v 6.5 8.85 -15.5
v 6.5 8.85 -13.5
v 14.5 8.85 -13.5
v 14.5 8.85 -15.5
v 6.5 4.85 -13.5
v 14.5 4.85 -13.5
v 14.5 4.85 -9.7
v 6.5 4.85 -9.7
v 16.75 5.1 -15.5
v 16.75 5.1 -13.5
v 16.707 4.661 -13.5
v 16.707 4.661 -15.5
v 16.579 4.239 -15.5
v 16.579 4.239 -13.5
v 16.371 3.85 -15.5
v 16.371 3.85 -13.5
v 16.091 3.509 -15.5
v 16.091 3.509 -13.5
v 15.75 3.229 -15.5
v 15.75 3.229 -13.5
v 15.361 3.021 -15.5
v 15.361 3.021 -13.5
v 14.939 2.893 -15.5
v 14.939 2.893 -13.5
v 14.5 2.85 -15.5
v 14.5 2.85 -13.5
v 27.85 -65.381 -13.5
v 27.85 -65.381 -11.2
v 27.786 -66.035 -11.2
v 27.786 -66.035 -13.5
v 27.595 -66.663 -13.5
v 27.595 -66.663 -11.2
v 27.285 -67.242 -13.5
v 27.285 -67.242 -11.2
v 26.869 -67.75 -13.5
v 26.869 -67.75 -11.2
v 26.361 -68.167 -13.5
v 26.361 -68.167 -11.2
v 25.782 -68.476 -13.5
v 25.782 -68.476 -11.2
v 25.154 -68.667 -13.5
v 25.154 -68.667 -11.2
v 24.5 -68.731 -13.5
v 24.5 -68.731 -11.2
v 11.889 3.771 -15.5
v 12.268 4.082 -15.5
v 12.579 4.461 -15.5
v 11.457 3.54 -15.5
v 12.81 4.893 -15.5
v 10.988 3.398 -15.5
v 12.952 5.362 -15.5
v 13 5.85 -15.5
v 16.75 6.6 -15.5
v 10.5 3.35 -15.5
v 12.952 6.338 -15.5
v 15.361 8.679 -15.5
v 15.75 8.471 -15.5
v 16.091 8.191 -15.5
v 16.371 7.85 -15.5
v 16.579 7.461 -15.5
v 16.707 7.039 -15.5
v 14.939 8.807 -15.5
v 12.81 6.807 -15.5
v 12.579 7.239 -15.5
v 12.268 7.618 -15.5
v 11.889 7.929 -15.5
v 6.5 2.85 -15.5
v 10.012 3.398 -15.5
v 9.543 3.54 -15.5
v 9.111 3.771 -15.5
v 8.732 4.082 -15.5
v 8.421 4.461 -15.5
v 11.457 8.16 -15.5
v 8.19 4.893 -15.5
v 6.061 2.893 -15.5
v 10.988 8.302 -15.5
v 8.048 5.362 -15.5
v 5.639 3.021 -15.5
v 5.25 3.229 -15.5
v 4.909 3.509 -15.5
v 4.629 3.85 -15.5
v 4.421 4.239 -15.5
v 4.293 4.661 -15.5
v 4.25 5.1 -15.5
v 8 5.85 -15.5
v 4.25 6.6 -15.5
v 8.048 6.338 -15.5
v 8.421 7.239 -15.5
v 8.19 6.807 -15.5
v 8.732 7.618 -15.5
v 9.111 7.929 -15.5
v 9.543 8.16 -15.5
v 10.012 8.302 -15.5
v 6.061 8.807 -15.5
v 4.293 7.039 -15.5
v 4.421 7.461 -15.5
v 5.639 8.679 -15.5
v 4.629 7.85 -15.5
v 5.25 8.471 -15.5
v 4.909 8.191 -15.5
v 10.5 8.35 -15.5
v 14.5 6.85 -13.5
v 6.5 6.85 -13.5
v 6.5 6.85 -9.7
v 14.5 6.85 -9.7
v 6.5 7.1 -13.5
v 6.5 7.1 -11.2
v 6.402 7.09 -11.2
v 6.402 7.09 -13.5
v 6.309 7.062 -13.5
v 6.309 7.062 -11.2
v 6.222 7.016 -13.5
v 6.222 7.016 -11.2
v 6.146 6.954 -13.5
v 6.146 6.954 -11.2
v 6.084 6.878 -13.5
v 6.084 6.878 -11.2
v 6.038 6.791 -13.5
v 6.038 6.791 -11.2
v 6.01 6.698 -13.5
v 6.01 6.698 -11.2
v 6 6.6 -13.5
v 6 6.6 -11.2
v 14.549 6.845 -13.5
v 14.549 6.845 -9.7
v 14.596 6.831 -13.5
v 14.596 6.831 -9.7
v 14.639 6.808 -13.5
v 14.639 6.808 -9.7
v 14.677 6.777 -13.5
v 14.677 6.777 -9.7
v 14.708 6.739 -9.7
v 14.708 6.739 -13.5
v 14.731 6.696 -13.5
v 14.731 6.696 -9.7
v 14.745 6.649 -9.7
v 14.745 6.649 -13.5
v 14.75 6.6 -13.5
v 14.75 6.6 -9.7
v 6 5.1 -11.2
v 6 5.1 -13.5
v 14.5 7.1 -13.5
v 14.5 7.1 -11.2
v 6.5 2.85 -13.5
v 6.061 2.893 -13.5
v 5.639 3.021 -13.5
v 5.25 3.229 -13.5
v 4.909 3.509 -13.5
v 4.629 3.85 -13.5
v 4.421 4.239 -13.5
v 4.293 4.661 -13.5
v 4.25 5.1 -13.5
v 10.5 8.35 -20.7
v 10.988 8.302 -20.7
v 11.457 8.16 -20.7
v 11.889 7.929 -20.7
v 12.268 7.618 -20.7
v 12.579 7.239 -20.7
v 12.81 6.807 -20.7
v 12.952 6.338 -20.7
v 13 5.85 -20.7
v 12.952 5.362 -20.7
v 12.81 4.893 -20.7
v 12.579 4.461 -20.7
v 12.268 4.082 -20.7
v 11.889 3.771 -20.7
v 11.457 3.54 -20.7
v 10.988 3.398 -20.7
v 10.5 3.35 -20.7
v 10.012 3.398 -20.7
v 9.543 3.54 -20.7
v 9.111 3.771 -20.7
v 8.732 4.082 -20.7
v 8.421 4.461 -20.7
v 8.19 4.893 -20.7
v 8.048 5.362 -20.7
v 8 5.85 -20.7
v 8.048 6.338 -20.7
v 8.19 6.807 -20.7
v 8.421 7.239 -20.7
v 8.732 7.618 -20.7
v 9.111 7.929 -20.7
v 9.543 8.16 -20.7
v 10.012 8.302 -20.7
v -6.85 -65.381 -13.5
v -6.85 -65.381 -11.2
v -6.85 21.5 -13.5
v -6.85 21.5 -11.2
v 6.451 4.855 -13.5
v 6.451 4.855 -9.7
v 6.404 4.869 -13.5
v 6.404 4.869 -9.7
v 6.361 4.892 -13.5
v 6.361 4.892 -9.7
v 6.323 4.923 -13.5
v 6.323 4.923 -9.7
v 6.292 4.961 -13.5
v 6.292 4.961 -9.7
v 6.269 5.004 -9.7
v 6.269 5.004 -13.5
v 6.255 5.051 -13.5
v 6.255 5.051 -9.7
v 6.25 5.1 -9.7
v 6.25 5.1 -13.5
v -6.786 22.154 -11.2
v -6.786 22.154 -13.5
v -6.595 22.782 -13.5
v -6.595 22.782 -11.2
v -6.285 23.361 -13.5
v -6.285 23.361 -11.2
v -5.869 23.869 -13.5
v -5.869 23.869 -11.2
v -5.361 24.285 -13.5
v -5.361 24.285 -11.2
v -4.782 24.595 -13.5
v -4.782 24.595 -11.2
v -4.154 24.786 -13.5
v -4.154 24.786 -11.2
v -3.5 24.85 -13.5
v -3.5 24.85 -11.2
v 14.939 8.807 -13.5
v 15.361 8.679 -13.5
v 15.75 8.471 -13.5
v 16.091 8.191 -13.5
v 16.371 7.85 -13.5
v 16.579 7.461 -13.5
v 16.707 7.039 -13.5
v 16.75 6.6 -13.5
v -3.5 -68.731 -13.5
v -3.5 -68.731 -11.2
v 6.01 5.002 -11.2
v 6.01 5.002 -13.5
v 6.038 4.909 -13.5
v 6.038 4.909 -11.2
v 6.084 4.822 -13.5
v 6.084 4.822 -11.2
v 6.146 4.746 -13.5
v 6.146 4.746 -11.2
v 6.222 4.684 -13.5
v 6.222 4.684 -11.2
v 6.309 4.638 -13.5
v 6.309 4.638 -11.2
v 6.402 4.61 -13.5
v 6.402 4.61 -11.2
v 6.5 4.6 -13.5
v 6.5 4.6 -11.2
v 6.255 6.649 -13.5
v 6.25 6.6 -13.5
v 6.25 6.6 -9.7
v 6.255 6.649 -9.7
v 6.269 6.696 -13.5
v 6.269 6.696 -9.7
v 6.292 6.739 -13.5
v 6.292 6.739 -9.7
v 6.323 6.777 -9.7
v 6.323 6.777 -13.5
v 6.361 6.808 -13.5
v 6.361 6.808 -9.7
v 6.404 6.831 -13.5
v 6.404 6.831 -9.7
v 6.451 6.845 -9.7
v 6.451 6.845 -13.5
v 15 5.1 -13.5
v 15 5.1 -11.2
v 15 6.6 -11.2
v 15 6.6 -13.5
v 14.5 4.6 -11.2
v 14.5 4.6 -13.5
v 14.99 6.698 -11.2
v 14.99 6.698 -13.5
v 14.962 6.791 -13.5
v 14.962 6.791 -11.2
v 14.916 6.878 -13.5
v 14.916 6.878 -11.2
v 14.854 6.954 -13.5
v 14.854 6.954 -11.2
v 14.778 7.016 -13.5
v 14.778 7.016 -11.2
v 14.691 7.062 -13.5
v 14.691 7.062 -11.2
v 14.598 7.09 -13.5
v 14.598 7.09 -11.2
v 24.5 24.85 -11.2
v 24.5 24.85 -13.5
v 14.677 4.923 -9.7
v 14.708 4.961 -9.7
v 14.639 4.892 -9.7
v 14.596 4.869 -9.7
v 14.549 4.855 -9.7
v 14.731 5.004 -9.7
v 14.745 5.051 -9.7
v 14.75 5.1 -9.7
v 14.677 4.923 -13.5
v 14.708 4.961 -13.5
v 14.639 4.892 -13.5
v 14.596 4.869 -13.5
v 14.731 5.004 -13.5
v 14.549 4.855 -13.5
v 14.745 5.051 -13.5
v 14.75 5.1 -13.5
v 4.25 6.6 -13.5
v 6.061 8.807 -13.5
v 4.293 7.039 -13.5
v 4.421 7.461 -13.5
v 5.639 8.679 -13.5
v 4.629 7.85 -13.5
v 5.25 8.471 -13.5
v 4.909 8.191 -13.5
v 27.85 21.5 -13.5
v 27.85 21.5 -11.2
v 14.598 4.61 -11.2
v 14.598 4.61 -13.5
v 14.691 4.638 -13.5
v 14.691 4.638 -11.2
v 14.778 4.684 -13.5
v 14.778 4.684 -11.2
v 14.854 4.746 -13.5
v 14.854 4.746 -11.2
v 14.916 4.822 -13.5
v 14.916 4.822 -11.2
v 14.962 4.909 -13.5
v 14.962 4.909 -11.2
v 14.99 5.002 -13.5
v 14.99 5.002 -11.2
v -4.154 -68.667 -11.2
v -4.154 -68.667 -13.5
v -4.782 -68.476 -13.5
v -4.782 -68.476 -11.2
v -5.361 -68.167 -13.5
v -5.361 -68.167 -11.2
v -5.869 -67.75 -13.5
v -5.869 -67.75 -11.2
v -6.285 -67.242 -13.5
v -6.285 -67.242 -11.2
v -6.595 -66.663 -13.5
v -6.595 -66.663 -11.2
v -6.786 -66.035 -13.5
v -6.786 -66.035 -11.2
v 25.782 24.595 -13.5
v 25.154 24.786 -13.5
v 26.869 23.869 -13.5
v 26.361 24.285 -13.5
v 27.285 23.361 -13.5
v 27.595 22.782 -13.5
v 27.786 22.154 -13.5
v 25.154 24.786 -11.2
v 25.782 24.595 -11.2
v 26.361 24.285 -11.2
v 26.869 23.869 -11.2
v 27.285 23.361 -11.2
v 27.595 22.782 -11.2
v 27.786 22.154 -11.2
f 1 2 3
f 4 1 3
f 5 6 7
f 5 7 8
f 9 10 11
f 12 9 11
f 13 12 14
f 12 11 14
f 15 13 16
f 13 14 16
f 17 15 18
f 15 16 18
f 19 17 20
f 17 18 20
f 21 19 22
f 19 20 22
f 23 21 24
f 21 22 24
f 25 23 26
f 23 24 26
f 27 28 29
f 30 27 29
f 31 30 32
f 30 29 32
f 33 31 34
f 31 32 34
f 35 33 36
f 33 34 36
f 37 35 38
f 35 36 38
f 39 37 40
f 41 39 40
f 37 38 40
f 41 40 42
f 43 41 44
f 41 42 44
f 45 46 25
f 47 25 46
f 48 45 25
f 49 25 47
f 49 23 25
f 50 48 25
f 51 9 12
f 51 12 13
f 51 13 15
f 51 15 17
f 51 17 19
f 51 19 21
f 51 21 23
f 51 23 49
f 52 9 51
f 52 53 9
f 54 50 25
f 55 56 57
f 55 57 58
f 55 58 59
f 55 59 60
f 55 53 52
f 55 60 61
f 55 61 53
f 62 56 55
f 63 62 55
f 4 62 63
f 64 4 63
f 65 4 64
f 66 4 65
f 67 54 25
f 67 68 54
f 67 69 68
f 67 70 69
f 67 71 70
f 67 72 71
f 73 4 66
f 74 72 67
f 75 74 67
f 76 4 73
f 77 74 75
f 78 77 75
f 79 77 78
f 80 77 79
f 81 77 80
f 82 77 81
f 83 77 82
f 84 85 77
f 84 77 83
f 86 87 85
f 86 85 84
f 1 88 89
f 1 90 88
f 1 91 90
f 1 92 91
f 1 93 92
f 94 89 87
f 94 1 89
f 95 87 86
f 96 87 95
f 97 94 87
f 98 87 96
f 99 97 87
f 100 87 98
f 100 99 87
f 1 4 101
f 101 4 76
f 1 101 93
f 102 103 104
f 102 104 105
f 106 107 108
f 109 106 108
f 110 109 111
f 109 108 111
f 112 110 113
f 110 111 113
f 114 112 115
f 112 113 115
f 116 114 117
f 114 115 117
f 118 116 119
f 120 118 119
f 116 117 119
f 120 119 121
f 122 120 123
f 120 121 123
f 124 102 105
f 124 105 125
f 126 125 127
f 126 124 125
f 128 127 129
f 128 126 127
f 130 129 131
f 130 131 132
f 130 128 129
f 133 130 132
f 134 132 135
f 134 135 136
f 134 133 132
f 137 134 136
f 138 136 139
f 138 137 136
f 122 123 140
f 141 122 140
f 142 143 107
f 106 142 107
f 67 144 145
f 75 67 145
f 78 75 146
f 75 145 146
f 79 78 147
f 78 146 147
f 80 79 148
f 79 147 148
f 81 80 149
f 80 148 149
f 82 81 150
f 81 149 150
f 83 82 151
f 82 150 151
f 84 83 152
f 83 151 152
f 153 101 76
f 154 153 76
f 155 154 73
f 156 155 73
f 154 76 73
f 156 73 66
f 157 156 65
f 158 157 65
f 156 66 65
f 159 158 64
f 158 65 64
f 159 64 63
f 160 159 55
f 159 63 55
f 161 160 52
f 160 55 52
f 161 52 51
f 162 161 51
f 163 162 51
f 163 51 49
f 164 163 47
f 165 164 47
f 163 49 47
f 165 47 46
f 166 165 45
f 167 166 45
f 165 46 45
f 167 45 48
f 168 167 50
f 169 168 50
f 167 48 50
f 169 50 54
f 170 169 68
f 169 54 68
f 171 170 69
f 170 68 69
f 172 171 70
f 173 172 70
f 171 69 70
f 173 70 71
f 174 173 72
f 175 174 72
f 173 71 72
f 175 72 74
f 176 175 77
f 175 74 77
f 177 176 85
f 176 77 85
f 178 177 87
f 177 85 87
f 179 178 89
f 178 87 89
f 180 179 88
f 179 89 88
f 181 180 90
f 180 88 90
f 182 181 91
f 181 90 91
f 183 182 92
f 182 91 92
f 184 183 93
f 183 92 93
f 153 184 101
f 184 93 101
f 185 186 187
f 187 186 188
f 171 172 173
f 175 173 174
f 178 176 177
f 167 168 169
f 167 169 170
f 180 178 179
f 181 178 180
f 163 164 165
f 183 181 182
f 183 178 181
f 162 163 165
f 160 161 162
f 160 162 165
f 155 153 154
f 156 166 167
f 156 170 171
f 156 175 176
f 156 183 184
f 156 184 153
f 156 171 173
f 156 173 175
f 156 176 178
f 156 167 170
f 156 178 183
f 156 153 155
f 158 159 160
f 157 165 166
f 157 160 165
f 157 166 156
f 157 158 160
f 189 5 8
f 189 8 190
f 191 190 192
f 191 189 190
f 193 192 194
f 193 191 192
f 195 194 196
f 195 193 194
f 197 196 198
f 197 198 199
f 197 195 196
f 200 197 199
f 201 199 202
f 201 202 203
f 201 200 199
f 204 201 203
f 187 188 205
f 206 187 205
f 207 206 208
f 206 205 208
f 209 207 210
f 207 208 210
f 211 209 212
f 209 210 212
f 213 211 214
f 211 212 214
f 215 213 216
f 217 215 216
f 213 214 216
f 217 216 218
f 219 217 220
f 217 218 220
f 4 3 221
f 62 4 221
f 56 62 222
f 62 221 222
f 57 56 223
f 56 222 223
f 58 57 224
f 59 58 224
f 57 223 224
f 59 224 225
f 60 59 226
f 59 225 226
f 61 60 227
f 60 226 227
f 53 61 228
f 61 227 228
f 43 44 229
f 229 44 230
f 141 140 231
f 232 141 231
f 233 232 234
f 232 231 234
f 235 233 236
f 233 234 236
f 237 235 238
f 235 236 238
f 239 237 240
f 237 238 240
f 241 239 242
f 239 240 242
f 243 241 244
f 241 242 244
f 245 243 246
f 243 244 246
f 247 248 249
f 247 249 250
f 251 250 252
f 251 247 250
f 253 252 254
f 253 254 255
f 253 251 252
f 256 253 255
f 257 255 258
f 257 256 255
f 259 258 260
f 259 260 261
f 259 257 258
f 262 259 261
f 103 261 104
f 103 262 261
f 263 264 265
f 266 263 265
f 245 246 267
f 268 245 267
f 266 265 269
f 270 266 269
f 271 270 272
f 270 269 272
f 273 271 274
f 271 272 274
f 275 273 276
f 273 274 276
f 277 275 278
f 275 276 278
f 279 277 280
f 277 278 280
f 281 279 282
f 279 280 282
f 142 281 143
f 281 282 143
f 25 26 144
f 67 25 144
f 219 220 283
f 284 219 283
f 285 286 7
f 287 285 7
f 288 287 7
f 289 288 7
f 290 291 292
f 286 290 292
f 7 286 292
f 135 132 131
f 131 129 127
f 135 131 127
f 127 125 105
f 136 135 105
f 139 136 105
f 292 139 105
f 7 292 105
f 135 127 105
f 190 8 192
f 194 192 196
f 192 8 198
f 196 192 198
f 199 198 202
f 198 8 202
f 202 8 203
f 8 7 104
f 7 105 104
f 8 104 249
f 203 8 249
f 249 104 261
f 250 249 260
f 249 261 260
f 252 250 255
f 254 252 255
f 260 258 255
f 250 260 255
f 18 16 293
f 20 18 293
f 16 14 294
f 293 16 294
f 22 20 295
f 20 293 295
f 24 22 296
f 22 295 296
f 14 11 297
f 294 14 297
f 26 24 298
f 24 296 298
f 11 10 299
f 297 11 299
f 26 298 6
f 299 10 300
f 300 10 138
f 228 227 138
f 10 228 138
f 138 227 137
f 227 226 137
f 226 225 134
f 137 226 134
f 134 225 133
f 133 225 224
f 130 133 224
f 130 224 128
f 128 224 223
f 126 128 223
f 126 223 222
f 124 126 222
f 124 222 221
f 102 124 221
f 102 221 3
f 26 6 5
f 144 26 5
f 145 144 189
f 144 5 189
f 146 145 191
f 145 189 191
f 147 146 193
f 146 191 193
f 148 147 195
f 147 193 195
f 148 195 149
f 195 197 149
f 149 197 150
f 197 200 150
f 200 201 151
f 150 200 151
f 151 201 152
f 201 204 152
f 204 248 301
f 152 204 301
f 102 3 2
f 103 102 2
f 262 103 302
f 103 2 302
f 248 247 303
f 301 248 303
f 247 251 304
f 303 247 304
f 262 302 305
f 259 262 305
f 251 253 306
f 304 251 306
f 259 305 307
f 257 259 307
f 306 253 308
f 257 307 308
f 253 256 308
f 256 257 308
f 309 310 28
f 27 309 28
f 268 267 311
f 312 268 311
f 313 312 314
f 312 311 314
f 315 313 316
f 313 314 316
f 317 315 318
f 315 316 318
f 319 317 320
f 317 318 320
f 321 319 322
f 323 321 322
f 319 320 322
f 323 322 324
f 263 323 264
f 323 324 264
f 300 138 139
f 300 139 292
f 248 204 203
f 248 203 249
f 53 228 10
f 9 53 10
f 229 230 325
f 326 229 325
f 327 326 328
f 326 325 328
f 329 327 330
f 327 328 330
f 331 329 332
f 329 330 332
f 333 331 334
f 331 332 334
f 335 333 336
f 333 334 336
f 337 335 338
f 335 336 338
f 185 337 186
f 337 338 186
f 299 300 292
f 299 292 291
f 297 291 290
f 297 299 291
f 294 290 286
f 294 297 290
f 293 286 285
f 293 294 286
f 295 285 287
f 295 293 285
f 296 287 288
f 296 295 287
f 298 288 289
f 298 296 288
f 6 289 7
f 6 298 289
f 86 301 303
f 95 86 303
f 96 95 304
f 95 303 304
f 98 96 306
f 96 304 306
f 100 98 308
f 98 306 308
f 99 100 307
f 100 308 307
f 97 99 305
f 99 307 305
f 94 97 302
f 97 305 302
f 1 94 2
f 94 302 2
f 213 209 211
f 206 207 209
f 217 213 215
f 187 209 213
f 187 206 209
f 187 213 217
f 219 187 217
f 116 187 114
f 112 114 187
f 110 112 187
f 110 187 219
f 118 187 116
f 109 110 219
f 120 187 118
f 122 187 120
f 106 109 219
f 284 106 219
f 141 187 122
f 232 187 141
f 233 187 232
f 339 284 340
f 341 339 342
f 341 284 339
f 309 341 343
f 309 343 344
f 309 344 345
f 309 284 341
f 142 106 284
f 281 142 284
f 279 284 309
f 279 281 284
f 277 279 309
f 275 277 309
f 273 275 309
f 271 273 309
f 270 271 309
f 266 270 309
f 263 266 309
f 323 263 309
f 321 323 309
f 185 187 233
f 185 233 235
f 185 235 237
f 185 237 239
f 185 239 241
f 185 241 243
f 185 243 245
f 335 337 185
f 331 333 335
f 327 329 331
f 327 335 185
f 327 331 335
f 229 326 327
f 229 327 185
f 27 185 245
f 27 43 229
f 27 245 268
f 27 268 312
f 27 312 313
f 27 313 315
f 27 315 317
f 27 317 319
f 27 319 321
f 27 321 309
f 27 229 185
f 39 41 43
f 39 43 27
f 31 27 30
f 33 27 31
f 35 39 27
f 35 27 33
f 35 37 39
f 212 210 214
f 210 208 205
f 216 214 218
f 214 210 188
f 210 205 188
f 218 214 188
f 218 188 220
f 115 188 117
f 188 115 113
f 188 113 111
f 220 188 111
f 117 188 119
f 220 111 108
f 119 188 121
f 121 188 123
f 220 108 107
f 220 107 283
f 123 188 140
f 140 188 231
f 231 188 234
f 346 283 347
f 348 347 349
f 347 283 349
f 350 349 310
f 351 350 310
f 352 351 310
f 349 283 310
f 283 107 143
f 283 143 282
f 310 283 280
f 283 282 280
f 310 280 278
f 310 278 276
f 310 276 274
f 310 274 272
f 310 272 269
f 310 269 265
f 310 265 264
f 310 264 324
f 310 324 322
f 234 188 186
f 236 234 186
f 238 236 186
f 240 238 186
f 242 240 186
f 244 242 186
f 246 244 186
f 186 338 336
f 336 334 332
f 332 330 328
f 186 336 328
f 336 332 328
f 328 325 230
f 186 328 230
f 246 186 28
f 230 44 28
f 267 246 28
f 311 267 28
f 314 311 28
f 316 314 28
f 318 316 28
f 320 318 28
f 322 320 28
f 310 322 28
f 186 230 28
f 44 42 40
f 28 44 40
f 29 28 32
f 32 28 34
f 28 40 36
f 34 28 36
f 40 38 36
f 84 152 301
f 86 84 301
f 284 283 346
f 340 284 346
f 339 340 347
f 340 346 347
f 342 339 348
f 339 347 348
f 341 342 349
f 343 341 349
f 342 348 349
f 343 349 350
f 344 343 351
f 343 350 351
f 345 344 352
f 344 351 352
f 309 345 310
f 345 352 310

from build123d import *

# Parameters (mm, degrees)
STOCK_PB_TOP_LID_SM_1_START = 11.200003695
STOCK_PB_TOP_LID_SM_1_DEPTH = 2.3
BOSS_EXTRUDE1_DEPTH         = 3.8
BOSS_EXTRUDE2_DEPTH         = 2
SKETCH5_R                   = 2.5
BOSS_EXTRUDE3_DEPTH         = 5.2


# Read off the part's stored shape, not the designer's step: Stock-pb_top_lid_sm-1
with BuildPart() as part:
    # Stock-pb_top_lid_sm-1 outline → Stock-pb_top_lid_sm-1 (new body)
    with BuildSketch(Plane(origin=(0, 0, 0), x_dir=(1, 0, 0), z_dir=(0, 1.3113422028449806e-07, -0.9999999999999915)).offset(STOCK_PB_TOP_LID_SM_1_START)):
        with BuildLine():
            Line((-3.5, -24.849998248), (24.5, -24.849998482))
            ThreePointArc((24.5, -24.849998482), (26.868807895, -23.868806125), (27.850000252, -21.49999823))
            Line((27.850000252, -21.49999823), (27.85, 65.381136149))
            ThreePointArc((27.85, 65.381136149), (26.868807717, 67.749943866), (24.5, 68.731136149))
            Line((24.5, 68.731136149), (-3.5, 68.731136149))
            ThreePointArc((-3.5, 68.731136149), (-5.868807606, 67.749943977), (-6.85, 65.381136463))
            Line((-6.85, 65.381136463), (-6.850000018, -21.49999823))
            ThreePointArc((-6.850000018, -21.49999823), (-5.86880773, -23.86880596), (-3.5, -24.849998248))
        make_face()
        with BuildLine():
            ThreePointArc((14.500000108, -4.599998248), (14.853553499, -4.746444857), (15.000000108, -5.099998248))
            Line((15.000000108, -5.099998248), (15.000000108, -6.599997786))
            ThreePointArc((15.000000108, -6.599997786), (14.853553662, -6.953551475), (14.500000108, -7.099998248))
            Line((14.500000108, -7.099998248), (6.500000108, -7.099998248))
            ThreePointArc((6.500000108, -7.099998248), (6.146446718, -6.953551638), (6.000000108, -6.599998248))
            Line((6.000000108, -6.599998248), (6.000000108, -5.099998248))
            ThreePointArc((6.000000108, -5.099998248), (6.146446717, -4.746444858), (6.500000108, -4.599998248))
            Line((6.500000108, -4.599998248), (14.500000108, -4.599998248))
        make_face(mode=Mode.SUBTRACT)
    extrude(amount=STOCK_PB_TOP_LID_SM_1_DEPTH)


with BuildPart() as body_2:
    # Sketch3 → Boss-Extrude1 (new body)
    with BuildSketch(Plane(origin=(0, 1.77e-06, -13.500003695), x_dir=(-1, 0, 0), z_dir=(0, 1.3113422028449777e-07, -0.9999999999999915))):
        with BuildLine():
            Line((-14.500000108, 4.849998248), (-6.500000108, 4.849998248))
            ThreePointArc((-6.500000108, 4.849998248), (-6.323223413, 4.923221552), (-6.250000108, 5.099998248))
            Line((-6.250000108, 5.099998248), (-6.250000108, 6.599998248))
            ThreePointArc((-6.250000108, 6.599998248), (-6.323223413, 6.776774943), (-6.500000108, 6.849998248))
            Line((-6.500000108, 6.849998248), (-14.500000108, 6.849998248))
            ThreePointArc((-14.500000108, 6.849998248), (-14.676776803, 6.776774943), (-14.750000108, 6.599998248))
            Line((-14.750000108, 6.599998248), (-14.750000108, 5.099998248))
            ThreePointArc((-14.750000108, 5.099998248), (-14.676776803, 4.923221552), (-14.500000108, 4.849998248))
        make_face()
    extrude(amount=-BOSS_EXTRUDE1_DEPTH)

    # Sketch4 → Boss-Extrude2 (add)
    with BuildSketch(Plane(origin=(0, 1.77e-06, -13.500003695), x_dir=(-1, 0, 0), z_dir=(0, 1.311342202844978e-07, -0.9999999999999915))):
        with BuildLine():
            Line((-4.250000108, 5.099998248), (-4.250000108, 6.599998248))
            ThreePointArc((-4.250000108, 6.599998248), (-4.909009851, 8.190988505), (-6.500000108, 8.849998248))
            Line((-6.500000108, 8.849998248), (-14.500000108, 8.849998248))
            ThreePointArc((-14.500000108, 8.849998248), (-16.090990366, 8.190988505), (-16.750000108, 6.599998248))
            Line((-16.750000108, 6.599998248), (-16.750000108, 5.099998248))
            ThreePointArc((-16.750000108, 5.099998248), (-16.090990366, 3.50900799), (-14.500000108, 2.849998248))
            Line((-14.500000108, 2.849998248), (-6.500000108, 2.849998248))
            ThreePointArc((-6.500000108, 2.849998248), (-4.909009851, 3.50900799), (-4.250000108, 5.099998248))
        make_face()
    extrude(amount=BOSS_EXTRUDE2_DEPTH)

    # Sketch5 → Boss-Extrude3 (add)
    with BuildSketch(Plane(origin=(0, 2.033e-06, -15.500003695), x_dir=(-1, 0, 0), z_dir=(0, 1.3113422028449782e-07, -0.9999999999999915))):
        with Locations(Location((-10.500000108, 5.849998248, 0), (0, 0, 90))):
            Circle(SKETCH5_R)
    extrude(amount=BOSS_EXTRUDE3_DEPTH)


solid = Compound([part.part, body_2.part])
